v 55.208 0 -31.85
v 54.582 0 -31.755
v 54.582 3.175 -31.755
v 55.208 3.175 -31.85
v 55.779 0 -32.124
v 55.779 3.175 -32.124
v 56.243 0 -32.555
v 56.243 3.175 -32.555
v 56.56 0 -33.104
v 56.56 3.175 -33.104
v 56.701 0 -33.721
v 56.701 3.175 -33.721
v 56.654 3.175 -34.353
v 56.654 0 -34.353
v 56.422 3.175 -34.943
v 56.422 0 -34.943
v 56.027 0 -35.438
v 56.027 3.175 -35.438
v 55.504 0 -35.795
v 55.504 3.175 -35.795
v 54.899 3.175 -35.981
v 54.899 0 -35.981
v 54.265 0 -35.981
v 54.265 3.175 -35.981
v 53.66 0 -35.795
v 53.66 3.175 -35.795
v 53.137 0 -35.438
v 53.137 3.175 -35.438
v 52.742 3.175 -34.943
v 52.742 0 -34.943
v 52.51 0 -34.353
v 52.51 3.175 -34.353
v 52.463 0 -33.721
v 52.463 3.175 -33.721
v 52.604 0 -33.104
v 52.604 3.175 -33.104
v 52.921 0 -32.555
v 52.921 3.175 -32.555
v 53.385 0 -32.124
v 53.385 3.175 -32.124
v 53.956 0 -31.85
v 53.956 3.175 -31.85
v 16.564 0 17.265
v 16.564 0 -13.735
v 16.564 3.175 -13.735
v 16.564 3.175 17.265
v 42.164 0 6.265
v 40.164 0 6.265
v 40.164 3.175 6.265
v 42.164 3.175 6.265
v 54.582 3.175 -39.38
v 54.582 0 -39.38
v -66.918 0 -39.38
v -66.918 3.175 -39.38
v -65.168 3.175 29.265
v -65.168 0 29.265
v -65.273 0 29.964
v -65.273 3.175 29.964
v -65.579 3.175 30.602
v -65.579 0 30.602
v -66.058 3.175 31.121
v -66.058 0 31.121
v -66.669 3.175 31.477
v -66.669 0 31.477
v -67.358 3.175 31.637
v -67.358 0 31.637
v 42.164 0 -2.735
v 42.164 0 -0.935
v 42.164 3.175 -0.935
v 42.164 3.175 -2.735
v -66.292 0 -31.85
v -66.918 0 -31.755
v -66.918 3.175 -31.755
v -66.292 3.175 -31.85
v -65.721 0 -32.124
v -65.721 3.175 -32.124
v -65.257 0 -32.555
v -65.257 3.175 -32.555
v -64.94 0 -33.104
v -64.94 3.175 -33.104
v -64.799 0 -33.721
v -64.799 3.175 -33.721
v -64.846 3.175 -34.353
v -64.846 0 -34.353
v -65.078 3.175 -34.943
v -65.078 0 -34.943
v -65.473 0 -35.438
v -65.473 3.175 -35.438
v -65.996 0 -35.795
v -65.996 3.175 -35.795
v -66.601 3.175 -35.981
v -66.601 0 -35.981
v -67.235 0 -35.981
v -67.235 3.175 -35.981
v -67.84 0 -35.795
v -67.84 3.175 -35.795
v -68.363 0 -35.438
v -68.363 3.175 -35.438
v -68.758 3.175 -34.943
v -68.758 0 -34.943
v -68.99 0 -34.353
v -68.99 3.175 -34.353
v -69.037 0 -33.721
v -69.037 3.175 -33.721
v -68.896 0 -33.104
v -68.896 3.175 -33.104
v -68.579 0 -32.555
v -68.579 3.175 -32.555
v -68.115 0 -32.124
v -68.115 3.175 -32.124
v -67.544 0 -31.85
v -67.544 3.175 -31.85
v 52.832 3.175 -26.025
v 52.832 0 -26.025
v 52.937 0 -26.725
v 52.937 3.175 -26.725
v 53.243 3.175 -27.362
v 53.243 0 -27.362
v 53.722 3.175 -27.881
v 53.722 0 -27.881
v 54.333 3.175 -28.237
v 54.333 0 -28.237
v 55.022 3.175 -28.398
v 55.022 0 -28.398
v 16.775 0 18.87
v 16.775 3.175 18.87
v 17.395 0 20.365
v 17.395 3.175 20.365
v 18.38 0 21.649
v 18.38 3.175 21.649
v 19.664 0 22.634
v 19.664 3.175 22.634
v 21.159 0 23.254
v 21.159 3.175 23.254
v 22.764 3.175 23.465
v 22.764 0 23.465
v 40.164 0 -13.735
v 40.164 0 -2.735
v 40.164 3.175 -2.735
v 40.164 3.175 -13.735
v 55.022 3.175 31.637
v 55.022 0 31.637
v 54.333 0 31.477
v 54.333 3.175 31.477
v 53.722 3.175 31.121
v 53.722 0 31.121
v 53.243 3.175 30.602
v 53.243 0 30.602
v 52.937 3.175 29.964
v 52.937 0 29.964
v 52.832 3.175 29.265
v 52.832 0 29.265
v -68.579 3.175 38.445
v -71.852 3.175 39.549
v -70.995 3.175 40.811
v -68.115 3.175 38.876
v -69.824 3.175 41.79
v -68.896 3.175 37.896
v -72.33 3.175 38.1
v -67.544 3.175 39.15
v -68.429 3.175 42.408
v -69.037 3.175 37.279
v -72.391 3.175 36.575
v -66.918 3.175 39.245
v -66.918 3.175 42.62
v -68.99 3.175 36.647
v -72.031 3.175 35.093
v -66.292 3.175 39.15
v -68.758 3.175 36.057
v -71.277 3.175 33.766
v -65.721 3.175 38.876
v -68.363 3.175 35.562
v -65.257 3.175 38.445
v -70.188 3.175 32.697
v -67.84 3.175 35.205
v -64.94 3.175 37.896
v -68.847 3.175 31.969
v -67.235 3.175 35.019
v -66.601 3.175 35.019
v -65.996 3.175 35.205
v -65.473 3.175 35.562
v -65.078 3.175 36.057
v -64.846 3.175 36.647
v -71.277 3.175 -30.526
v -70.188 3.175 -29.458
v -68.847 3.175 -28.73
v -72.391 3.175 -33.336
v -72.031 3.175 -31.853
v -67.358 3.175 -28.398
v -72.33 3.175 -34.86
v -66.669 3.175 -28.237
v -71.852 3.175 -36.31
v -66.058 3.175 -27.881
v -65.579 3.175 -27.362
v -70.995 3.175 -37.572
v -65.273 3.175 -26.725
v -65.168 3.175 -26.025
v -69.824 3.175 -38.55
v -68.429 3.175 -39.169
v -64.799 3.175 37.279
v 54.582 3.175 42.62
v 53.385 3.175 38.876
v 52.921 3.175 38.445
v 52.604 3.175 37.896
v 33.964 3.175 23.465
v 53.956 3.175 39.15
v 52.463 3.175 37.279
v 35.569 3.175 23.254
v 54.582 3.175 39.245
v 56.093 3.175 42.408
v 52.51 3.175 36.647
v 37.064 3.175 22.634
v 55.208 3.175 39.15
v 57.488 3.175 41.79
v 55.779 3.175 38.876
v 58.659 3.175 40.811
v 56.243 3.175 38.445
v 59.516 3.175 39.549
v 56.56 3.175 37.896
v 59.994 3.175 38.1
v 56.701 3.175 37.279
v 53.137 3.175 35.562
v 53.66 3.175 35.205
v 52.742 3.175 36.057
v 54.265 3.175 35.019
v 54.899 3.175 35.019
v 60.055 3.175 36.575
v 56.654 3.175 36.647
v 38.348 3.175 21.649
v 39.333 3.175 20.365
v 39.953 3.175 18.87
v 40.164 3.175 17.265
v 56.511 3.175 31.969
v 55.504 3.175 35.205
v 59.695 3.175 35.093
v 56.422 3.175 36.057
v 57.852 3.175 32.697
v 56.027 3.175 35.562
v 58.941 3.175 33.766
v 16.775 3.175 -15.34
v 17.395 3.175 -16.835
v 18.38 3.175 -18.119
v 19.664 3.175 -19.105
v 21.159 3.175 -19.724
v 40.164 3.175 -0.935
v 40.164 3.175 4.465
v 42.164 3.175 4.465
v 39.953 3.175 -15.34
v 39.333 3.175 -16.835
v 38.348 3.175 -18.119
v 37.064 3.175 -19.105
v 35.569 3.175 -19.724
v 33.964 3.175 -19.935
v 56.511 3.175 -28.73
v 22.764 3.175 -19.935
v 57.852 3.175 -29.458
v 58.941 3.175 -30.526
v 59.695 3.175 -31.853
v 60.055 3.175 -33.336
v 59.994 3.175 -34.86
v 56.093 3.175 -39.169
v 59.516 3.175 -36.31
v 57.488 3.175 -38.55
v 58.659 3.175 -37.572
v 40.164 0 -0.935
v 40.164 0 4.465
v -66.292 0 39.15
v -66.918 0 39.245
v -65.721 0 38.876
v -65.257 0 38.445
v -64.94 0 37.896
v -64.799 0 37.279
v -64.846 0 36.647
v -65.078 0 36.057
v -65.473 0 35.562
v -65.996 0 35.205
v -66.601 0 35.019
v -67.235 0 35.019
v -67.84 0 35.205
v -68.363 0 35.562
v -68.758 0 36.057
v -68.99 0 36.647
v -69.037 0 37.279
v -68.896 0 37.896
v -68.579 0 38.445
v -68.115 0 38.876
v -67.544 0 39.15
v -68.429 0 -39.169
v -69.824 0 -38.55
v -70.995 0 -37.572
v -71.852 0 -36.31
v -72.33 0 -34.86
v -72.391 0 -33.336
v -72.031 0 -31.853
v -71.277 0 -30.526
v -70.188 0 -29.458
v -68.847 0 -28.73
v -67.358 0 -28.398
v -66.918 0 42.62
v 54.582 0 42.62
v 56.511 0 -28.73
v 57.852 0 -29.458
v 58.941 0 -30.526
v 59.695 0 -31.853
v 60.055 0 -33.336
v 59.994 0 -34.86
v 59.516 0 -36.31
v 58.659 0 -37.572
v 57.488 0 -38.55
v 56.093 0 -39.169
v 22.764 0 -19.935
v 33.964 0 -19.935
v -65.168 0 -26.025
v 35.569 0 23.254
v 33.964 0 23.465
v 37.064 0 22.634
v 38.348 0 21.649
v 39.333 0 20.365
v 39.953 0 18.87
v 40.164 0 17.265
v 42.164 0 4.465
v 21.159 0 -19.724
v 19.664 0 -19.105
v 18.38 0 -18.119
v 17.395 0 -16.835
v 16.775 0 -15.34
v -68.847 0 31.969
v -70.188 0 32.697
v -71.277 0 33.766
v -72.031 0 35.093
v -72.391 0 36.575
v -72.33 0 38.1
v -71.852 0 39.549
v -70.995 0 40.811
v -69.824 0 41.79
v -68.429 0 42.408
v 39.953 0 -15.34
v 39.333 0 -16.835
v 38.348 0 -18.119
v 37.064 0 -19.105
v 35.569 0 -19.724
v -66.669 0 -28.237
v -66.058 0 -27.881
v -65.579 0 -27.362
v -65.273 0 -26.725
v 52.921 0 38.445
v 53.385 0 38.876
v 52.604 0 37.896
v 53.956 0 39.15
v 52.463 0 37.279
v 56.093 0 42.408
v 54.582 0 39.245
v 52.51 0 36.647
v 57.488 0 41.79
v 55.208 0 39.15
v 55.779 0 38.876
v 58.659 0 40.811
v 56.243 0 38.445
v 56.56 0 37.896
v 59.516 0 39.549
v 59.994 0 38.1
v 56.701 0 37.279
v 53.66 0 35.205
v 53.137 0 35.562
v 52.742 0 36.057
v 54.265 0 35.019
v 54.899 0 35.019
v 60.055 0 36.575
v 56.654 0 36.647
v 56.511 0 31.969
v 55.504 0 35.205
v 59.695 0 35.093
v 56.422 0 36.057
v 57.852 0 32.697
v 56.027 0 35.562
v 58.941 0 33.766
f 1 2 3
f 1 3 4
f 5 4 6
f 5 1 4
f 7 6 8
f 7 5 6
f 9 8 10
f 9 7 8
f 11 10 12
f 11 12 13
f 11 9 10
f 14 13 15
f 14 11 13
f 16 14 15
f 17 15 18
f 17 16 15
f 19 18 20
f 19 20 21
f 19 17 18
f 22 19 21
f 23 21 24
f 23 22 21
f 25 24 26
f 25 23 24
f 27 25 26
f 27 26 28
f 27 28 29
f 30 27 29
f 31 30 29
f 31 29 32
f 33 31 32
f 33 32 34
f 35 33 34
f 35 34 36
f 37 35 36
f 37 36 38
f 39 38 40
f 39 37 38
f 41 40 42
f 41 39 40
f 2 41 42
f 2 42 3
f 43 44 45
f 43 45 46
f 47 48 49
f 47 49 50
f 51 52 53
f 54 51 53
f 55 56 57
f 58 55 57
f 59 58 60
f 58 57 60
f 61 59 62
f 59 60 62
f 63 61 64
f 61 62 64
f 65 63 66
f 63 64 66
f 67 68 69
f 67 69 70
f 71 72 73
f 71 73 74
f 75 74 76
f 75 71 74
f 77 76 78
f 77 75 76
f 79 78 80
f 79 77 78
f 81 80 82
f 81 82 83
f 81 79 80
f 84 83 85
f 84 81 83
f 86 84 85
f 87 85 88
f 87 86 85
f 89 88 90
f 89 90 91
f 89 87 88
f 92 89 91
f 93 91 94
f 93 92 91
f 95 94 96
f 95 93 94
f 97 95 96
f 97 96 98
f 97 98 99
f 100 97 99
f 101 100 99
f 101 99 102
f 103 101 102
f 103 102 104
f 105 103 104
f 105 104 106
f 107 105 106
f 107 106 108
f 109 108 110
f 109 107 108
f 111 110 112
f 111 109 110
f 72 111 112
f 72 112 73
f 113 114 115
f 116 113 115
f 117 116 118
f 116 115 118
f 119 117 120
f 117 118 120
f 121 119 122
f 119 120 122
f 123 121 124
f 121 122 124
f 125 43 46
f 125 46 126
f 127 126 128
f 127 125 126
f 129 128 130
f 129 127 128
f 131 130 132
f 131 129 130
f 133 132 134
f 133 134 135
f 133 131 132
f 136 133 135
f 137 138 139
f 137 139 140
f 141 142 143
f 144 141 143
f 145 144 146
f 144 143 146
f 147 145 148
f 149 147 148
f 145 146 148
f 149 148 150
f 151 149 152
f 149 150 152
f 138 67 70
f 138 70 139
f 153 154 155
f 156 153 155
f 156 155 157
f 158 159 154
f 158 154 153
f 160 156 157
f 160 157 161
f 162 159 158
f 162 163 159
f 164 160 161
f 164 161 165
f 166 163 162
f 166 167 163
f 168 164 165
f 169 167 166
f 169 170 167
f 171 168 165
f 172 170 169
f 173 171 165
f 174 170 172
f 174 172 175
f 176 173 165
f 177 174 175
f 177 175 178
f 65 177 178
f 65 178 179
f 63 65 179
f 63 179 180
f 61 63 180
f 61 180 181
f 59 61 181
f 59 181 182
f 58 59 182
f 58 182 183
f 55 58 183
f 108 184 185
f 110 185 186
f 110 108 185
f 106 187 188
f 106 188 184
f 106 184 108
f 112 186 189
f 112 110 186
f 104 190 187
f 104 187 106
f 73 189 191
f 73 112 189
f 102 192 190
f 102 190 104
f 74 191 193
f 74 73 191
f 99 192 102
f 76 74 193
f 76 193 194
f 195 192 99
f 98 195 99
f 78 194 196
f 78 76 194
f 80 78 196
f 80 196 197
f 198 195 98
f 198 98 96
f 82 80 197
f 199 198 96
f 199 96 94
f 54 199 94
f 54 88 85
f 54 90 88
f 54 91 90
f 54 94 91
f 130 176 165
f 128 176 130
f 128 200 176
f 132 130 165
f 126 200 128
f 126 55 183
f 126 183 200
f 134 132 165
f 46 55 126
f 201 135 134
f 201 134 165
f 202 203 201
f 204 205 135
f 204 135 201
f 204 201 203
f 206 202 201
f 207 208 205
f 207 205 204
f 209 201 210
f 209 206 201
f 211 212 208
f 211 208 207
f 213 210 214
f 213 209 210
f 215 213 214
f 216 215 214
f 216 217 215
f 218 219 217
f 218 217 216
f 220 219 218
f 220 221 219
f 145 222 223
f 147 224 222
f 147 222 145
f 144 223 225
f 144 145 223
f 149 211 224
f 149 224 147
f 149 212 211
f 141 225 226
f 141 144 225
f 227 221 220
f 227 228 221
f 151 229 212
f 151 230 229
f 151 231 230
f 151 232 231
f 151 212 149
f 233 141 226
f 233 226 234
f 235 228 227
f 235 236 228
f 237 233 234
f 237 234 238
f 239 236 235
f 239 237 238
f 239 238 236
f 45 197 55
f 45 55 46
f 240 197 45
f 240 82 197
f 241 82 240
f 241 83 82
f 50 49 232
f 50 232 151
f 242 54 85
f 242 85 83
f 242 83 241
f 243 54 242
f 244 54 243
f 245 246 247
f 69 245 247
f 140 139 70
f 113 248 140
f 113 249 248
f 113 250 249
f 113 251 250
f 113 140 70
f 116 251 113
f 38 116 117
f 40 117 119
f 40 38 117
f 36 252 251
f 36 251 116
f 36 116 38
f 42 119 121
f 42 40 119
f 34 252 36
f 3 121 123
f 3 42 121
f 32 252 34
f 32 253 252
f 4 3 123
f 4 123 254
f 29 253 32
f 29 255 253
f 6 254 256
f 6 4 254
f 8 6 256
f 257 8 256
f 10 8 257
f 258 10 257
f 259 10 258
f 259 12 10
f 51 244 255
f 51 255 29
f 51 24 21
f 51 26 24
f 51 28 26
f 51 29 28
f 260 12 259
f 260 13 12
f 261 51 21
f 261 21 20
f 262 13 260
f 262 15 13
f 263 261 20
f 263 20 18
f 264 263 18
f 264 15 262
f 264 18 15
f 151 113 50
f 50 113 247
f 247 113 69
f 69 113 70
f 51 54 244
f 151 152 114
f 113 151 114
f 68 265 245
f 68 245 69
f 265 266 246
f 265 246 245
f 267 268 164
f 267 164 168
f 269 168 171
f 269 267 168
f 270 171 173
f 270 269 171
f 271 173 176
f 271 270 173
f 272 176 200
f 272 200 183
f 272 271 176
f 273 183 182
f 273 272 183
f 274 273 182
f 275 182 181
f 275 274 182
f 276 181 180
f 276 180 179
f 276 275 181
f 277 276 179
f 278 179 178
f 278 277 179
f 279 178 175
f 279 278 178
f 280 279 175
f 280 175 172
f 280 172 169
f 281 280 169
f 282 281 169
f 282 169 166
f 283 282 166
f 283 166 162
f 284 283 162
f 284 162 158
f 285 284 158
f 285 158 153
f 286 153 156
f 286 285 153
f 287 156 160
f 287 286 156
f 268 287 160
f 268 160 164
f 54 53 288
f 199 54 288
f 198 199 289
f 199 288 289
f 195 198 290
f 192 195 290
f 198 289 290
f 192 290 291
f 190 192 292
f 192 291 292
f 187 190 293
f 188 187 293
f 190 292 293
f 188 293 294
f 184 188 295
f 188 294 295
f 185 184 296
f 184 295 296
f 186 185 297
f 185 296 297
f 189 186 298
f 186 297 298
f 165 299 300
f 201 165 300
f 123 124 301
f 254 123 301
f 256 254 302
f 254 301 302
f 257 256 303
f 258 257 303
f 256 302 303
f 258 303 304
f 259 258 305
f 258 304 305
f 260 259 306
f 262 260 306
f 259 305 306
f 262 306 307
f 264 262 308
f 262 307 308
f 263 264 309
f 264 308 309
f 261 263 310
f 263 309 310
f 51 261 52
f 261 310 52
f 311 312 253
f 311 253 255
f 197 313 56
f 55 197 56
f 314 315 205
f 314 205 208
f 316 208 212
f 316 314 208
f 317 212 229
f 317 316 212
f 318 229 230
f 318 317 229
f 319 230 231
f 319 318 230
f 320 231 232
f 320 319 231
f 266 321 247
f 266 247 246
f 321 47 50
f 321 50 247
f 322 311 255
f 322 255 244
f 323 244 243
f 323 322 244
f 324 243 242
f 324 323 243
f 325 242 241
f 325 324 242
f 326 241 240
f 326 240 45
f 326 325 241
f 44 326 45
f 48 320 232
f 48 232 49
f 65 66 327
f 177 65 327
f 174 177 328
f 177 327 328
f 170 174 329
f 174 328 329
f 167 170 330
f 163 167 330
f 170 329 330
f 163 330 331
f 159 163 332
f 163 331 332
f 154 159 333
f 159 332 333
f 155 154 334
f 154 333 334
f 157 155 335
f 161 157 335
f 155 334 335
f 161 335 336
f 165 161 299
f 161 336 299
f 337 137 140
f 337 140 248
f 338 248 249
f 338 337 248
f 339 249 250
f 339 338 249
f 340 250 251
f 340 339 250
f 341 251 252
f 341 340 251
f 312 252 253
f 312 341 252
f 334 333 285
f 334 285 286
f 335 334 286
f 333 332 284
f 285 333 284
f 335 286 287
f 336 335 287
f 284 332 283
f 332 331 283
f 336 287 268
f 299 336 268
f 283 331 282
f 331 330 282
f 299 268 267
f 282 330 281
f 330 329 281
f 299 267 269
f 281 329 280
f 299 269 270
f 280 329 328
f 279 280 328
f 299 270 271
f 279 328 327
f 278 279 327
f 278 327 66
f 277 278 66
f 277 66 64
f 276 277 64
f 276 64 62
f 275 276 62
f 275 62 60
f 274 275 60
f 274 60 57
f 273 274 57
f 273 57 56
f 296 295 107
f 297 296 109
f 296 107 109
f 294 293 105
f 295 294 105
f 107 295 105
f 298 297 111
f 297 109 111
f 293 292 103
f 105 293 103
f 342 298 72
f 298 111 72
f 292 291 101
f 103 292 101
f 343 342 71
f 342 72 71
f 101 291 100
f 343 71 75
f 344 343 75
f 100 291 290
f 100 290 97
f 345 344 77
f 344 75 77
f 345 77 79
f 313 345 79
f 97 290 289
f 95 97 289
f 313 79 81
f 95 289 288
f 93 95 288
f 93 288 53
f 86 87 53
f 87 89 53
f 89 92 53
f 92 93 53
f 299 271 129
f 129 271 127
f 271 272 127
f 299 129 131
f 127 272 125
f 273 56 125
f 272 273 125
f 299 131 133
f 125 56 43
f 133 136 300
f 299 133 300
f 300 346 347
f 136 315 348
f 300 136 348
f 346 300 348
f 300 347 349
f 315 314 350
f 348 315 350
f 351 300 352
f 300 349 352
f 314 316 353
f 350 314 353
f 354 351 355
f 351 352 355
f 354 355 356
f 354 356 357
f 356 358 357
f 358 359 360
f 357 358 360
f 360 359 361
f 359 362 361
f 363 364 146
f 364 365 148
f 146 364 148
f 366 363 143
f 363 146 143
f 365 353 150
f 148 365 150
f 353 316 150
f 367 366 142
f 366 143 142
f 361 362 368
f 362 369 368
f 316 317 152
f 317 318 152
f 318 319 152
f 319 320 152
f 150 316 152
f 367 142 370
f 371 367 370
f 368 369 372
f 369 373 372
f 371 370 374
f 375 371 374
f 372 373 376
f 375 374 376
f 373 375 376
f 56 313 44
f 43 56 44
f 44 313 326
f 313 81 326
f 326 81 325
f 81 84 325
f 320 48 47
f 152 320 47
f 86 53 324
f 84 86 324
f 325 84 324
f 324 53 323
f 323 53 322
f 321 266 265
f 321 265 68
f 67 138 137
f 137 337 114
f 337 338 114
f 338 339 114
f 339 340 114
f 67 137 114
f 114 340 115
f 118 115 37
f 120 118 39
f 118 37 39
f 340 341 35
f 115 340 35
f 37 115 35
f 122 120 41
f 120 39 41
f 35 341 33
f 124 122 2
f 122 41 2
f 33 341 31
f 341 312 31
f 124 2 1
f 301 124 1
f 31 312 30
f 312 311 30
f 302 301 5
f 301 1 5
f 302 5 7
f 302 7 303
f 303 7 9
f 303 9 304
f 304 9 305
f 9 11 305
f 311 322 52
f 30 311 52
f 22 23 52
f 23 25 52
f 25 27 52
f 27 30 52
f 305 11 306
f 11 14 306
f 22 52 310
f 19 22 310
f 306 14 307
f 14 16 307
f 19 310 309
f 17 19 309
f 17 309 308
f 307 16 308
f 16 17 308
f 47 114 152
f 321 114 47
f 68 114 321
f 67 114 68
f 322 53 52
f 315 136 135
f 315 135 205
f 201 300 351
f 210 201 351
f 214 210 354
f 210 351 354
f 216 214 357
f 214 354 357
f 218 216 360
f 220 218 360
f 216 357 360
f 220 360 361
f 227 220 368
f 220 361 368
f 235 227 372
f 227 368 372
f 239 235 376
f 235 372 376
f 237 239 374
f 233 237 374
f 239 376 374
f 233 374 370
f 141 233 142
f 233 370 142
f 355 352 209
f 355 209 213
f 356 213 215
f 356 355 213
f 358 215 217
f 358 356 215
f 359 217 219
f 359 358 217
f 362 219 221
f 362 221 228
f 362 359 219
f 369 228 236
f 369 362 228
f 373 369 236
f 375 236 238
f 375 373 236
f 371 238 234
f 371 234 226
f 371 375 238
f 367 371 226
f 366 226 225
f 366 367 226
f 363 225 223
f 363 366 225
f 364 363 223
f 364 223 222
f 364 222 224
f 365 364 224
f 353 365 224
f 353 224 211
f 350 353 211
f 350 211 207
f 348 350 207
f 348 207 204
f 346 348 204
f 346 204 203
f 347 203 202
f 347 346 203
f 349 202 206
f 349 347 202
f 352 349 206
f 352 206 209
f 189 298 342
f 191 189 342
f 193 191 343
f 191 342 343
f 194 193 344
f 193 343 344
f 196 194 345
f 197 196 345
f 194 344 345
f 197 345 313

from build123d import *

# Parameters (mm, degrees)
SKETCH1_R           = 2.125
BOSS_EXTRUDE1_DEPTH = 3.175


with BuildPart() as part:
    # Sketch1 → Boss-Extrude1 (new body)
    with BuildSketch(Plane(origin=(0, 0, 0), x_dir=(1, 0, 0), z_dir=(0, 1, 0))):
        with BuildLine():
            Line((52.831908676, -29.265059171), (52.831908676, 26.025389594))
            ThreePointArc((52.831908676, 26.025389594), (53.463014101, 27.639628661), (55.021629488, 28.397771062))
            ThreePointArc((55.021629488, 28.397771062), (60.077505451, 34.100201776), (54.581908676, 39.380165211))
            Line((54.581908676, 39.380165211), (-66.918091324, 39.380165211))
            ThreePointArc((-66.918091324, 39.380165211), (-72.413688099, 34.100201776), (-67.357812136, 28.397771062))
            ThreePointArc((-67.357812136, 28.397771062), (-65.799196749, 27.639628661), (-65.168091324, 26.025389594))
            Line((-65.168091324, 26.025389594), (-65.168091324, -29.265059171))
            ThreePointArc((-65.168091324, -29.265059171), (-65.799196749, -30.879298239), (-67.357812136, -31.63744064))
            ThreePointArc((-67.357812136, -31.63744064), (-72.413688099, -37.339871353), (-66.918091324, -42.619834789))
            Line((-66.918091324, -42.619834789), (54.581908676, -42.619834789))
            ThreePointArc((54.581908676, -42.619834789), (60.077505451, -37.339871353), (55.021629488, -31.63744064))
            ThreePointArc((55.021629488, -31.63744064), (53.463014101, -30.879298239), (52.831908676, -29.265059171))
        make_face()
        with Locations(Location((-66.918091324, 33.880165211, 0), (0, 0, 270))):
            Circle(SKETCH1_R, mode=Mode.SUBTRACT)
        with Locations(Location((54.581908676, 33.880165211, 0), (0, 0, 270))):
            Circle(SKETCH1_R, mode=Mode.SUBTRACT)
        with Locations(Location((54.581908676, -37.119834789, 0), (0, 0, 270))):
            Circle(SKETCH1_R, mode=Mode.SUBTRACT)
        with Locations(Location((-66.918091324, -37.119834789, 0), (0, 0, 270))):
            Circle(SKETCH1_R, mode=Mode.SUBTRACT)
        with BuildLine():
            Line((40.163908241, -6.264833275), (42.163908241, -6.264833251))
            Line((42.163908241, -6.264833251), (42.16390822, -4.464833251))
            Line((42.16390822, -4.464833251), (40.16390822, -4.464833275))
            Line((40.16390822, -4.464833275), (40.163908156, 0.935166725))
            Line((40.163908156, 0.935166725), (42.163908156, 0.935166749))
            Line((42.163908156, 0.935166749), (42.163908134, 2.735166749))
            Line((42.163908134, 2.735166749), (40.163908134, 2.735166725))
            Line((40.163908134, 2.735166725), (40.163908003, 13.735166725))
            ThreePointArc((40.163908003, 13.735166725), (38.347969994, 18.119228747), (33.963907929, 19.935166651))
            Line((33.963907929, 19.935166651), (22.763907929, 19.935166518))
            ThreePointArc((22.763907929, 19.935166518), (18.379845907, 18.119228509), (16.563908003, 13.735166444))
            Line((16.563908003, 13.735166444), (16.563908373, -17.264833556))
            ThreePointArc((16.563908373, -17.264833556), (18.379846382, -21.648895578), (22.763908447, -23.464833482))
            Line((22.763908447, -23.464833482), (33.963908447, -23.464833349))
            ThreePointArc((33.963908447, -23.464833349), (38.347970468, -21.64889534), (40.163908373, -17.264833275))
            Line((40.163908373, -17.264833275), (40.163908241, -6.264833275))
        make_face(mode=Mode.SUBTRACT)
    extrude(amount=BOSS_EXTRUDE1_DEPTH)


solid = part.part
